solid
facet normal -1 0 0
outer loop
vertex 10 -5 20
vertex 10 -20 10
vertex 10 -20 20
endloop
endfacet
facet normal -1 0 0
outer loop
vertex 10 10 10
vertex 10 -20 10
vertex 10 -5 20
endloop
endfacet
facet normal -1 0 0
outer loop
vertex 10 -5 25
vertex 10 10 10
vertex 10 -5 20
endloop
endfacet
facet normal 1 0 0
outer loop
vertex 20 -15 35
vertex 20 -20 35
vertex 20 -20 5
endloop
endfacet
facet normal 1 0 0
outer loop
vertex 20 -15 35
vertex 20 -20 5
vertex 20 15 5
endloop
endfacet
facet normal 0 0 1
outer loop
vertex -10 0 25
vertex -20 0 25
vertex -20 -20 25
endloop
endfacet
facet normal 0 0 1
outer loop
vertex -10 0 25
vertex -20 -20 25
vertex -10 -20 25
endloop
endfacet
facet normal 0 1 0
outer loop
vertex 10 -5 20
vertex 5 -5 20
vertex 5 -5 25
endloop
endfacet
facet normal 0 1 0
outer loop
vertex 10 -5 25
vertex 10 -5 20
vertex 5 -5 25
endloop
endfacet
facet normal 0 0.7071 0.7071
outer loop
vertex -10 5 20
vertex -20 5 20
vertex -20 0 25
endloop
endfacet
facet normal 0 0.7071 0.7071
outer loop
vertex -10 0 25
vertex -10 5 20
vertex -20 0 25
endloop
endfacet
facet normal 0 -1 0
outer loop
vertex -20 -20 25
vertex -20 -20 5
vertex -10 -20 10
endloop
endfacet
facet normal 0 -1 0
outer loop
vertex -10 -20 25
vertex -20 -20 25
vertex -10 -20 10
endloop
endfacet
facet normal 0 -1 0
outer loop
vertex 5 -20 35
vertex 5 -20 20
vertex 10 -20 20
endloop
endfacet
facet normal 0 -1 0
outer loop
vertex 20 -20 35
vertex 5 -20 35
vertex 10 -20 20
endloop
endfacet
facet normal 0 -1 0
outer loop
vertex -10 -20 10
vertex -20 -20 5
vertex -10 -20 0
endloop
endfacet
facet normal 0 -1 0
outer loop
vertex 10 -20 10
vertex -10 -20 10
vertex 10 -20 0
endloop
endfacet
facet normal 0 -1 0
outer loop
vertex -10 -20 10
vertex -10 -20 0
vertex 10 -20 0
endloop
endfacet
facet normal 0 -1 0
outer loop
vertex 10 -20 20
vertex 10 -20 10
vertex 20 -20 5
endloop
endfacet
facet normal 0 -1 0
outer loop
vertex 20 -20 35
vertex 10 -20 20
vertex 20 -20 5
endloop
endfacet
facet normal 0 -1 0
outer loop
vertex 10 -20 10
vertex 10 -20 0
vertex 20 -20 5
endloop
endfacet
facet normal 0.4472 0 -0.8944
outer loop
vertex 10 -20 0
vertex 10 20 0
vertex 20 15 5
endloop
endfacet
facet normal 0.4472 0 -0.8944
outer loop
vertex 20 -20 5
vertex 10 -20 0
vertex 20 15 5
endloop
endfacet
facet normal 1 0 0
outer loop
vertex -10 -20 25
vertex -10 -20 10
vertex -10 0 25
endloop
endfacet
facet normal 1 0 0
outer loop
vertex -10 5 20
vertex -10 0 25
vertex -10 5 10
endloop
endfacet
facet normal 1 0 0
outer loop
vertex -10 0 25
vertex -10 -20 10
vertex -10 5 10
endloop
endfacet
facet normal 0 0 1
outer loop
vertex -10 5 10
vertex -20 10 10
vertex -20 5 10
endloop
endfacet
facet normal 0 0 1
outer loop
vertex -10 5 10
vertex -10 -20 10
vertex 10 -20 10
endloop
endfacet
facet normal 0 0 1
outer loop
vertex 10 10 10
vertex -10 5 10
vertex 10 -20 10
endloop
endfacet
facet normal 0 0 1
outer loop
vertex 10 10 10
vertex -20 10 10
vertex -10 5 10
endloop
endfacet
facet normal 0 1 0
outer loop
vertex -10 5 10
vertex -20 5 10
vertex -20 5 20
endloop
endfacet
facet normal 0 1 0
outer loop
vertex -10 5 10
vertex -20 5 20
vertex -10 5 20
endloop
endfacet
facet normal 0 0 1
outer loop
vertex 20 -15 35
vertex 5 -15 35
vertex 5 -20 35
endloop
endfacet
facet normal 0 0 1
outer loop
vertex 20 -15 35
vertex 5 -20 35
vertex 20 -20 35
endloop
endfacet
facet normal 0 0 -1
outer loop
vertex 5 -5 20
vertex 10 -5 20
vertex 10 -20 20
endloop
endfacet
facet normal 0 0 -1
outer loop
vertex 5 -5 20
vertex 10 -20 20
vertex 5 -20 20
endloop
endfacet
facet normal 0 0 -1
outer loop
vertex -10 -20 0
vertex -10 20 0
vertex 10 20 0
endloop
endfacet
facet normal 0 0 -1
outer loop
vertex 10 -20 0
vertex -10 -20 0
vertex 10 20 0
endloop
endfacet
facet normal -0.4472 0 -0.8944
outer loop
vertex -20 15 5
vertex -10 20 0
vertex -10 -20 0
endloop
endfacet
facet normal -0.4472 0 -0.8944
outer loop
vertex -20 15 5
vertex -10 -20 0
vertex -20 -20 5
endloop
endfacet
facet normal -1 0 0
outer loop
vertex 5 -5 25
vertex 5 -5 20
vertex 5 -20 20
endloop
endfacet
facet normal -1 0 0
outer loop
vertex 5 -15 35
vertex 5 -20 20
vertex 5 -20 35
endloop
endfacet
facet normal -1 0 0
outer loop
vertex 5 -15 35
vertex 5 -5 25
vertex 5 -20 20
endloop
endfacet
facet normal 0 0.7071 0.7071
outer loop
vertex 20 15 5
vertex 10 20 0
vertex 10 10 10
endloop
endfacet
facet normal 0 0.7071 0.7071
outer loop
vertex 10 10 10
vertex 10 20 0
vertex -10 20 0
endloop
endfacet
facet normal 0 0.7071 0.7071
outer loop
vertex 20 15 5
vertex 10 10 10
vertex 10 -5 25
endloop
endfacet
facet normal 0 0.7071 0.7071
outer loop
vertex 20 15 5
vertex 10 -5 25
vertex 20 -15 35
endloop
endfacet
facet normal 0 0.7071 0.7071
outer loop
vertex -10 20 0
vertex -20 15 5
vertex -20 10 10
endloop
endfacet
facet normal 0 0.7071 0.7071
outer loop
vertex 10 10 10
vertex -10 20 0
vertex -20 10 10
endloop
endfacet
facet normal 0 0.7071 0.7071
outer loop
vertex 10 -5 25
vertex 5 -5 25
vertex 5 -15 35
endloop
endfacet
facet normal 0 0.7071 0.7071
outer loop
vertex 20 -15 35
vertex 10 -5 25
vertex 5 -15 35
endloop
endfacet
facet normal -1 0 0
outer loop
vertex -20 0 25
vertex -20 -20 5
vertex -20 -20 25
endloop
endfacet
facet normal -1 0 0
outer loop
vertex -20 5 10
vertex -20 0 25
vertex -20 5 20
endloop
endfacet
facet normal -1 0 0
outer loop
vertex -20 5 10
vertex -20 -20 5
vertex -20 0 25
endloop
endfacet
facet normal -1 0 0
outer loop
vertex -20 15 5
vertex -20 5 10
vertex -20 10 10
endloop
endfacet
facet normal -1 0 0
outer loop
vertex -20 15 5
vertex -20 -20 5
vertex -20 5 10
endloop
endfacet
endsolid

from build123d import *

# Parameters (mm, degrees)
SKETCH1_W           = 40
SKETCH1_H           = 40
BOSS_EXTRUDE1_DEPTH = 35
CUT_EXTRUDE1_DEPTH  = 41
CUT_EXTRUDE3_DEPTH  = 41
CUT_EXTRUDE4_DEPTH  = 5
SKETCH5_W           = 10
SKETCH5_H           = 25
BOSS_EXTRUDE2_DEPTH = 15
CUT_EXTRUDE5_DEPTH  = 15
CUT_EXTRUDE6_DEPTH  = 41


with BuildPart() as part:
    # Sketch1 → Boss-Extrude1 (new body)
    with BuildSketch(Plane.XY):
        Rectangle(SKETCH1_W, SKETCH1_H)
    extrude(amount=BOSS_EXTRUDE1_DEPTH)

    # Sketch2 → Cut-Extrude1 (cut, through all)
    with BuildSketch(Plane(origin=(0, 20, 0), x_dir=(1, 0, 0), z_dir=(0, 1, 0))):
        Polygon((-20, -10), (10, -10), (10, -20), (5, -20), (5, -35), (-20, -35), align=None)
    extrude(amount=-CUT_EXTRUDE1_DEPTH, mode=Mode.SUBTRACT)

    # Sketch3 → Cut-Extrude3 (cut, through all)
    with BuildSketch(Plane(origin=(-20, 0, 0), x_dir=(0, 0, -1), z_dir=(1, 0, 0))):
        Polygon((0, 20), (-35, -15), (-35, 20), align=None)
    extrude(amount=CUT_EXTRUDE3_DEPTH, mode=Mode.SUBTRACT)

    # Sketch4 → Cut-Extrude4 (cut)
    with BuildSketch(Plane.ZY.offset(-5)):
        Polygon((20, 0), (20, -5), (25, -5), align=None)
    extrude(amount=-CUT_EXTRUDE4_DEPTH, mode=Mode.SUBTRACT)

    # Sketch5 → Boss-Extrude2 (add)
    with BuildSketch(Plane.XY.offset(10)):
        with Locations((-15, -7.5)):
            Rectangle(SKETCH5_W, SKETCH5_H)
    extrude(amount=BOSS_EXTRUDE2_DEPTH)

    # Sketch6 → Cut-Extrude5 (cut)
    with BuildSketch(Plane.ZY.offset(20)):
        Polygon((25, 5), (20, 5), (25, 0), align=None)
    extrude(amount=-CUT_EXTRUDE5_DEPTH, mode=Mode.SUBTRACT)

    # Sketch7 → Cut-Extrude6 (cut, through all)
    with BuildSketch(Plane.XZ.offset(20)):
        Polygon((10, 0), (20, 5), (20, 0), align=None)
        Polygon((-20, 0), (-10, 0), (-20, 5), align=None)
    extrude(amount=-CUT_EXTRUDE6_DEPTH, mode=Mode.SUBTRACT)


solid = part.part
